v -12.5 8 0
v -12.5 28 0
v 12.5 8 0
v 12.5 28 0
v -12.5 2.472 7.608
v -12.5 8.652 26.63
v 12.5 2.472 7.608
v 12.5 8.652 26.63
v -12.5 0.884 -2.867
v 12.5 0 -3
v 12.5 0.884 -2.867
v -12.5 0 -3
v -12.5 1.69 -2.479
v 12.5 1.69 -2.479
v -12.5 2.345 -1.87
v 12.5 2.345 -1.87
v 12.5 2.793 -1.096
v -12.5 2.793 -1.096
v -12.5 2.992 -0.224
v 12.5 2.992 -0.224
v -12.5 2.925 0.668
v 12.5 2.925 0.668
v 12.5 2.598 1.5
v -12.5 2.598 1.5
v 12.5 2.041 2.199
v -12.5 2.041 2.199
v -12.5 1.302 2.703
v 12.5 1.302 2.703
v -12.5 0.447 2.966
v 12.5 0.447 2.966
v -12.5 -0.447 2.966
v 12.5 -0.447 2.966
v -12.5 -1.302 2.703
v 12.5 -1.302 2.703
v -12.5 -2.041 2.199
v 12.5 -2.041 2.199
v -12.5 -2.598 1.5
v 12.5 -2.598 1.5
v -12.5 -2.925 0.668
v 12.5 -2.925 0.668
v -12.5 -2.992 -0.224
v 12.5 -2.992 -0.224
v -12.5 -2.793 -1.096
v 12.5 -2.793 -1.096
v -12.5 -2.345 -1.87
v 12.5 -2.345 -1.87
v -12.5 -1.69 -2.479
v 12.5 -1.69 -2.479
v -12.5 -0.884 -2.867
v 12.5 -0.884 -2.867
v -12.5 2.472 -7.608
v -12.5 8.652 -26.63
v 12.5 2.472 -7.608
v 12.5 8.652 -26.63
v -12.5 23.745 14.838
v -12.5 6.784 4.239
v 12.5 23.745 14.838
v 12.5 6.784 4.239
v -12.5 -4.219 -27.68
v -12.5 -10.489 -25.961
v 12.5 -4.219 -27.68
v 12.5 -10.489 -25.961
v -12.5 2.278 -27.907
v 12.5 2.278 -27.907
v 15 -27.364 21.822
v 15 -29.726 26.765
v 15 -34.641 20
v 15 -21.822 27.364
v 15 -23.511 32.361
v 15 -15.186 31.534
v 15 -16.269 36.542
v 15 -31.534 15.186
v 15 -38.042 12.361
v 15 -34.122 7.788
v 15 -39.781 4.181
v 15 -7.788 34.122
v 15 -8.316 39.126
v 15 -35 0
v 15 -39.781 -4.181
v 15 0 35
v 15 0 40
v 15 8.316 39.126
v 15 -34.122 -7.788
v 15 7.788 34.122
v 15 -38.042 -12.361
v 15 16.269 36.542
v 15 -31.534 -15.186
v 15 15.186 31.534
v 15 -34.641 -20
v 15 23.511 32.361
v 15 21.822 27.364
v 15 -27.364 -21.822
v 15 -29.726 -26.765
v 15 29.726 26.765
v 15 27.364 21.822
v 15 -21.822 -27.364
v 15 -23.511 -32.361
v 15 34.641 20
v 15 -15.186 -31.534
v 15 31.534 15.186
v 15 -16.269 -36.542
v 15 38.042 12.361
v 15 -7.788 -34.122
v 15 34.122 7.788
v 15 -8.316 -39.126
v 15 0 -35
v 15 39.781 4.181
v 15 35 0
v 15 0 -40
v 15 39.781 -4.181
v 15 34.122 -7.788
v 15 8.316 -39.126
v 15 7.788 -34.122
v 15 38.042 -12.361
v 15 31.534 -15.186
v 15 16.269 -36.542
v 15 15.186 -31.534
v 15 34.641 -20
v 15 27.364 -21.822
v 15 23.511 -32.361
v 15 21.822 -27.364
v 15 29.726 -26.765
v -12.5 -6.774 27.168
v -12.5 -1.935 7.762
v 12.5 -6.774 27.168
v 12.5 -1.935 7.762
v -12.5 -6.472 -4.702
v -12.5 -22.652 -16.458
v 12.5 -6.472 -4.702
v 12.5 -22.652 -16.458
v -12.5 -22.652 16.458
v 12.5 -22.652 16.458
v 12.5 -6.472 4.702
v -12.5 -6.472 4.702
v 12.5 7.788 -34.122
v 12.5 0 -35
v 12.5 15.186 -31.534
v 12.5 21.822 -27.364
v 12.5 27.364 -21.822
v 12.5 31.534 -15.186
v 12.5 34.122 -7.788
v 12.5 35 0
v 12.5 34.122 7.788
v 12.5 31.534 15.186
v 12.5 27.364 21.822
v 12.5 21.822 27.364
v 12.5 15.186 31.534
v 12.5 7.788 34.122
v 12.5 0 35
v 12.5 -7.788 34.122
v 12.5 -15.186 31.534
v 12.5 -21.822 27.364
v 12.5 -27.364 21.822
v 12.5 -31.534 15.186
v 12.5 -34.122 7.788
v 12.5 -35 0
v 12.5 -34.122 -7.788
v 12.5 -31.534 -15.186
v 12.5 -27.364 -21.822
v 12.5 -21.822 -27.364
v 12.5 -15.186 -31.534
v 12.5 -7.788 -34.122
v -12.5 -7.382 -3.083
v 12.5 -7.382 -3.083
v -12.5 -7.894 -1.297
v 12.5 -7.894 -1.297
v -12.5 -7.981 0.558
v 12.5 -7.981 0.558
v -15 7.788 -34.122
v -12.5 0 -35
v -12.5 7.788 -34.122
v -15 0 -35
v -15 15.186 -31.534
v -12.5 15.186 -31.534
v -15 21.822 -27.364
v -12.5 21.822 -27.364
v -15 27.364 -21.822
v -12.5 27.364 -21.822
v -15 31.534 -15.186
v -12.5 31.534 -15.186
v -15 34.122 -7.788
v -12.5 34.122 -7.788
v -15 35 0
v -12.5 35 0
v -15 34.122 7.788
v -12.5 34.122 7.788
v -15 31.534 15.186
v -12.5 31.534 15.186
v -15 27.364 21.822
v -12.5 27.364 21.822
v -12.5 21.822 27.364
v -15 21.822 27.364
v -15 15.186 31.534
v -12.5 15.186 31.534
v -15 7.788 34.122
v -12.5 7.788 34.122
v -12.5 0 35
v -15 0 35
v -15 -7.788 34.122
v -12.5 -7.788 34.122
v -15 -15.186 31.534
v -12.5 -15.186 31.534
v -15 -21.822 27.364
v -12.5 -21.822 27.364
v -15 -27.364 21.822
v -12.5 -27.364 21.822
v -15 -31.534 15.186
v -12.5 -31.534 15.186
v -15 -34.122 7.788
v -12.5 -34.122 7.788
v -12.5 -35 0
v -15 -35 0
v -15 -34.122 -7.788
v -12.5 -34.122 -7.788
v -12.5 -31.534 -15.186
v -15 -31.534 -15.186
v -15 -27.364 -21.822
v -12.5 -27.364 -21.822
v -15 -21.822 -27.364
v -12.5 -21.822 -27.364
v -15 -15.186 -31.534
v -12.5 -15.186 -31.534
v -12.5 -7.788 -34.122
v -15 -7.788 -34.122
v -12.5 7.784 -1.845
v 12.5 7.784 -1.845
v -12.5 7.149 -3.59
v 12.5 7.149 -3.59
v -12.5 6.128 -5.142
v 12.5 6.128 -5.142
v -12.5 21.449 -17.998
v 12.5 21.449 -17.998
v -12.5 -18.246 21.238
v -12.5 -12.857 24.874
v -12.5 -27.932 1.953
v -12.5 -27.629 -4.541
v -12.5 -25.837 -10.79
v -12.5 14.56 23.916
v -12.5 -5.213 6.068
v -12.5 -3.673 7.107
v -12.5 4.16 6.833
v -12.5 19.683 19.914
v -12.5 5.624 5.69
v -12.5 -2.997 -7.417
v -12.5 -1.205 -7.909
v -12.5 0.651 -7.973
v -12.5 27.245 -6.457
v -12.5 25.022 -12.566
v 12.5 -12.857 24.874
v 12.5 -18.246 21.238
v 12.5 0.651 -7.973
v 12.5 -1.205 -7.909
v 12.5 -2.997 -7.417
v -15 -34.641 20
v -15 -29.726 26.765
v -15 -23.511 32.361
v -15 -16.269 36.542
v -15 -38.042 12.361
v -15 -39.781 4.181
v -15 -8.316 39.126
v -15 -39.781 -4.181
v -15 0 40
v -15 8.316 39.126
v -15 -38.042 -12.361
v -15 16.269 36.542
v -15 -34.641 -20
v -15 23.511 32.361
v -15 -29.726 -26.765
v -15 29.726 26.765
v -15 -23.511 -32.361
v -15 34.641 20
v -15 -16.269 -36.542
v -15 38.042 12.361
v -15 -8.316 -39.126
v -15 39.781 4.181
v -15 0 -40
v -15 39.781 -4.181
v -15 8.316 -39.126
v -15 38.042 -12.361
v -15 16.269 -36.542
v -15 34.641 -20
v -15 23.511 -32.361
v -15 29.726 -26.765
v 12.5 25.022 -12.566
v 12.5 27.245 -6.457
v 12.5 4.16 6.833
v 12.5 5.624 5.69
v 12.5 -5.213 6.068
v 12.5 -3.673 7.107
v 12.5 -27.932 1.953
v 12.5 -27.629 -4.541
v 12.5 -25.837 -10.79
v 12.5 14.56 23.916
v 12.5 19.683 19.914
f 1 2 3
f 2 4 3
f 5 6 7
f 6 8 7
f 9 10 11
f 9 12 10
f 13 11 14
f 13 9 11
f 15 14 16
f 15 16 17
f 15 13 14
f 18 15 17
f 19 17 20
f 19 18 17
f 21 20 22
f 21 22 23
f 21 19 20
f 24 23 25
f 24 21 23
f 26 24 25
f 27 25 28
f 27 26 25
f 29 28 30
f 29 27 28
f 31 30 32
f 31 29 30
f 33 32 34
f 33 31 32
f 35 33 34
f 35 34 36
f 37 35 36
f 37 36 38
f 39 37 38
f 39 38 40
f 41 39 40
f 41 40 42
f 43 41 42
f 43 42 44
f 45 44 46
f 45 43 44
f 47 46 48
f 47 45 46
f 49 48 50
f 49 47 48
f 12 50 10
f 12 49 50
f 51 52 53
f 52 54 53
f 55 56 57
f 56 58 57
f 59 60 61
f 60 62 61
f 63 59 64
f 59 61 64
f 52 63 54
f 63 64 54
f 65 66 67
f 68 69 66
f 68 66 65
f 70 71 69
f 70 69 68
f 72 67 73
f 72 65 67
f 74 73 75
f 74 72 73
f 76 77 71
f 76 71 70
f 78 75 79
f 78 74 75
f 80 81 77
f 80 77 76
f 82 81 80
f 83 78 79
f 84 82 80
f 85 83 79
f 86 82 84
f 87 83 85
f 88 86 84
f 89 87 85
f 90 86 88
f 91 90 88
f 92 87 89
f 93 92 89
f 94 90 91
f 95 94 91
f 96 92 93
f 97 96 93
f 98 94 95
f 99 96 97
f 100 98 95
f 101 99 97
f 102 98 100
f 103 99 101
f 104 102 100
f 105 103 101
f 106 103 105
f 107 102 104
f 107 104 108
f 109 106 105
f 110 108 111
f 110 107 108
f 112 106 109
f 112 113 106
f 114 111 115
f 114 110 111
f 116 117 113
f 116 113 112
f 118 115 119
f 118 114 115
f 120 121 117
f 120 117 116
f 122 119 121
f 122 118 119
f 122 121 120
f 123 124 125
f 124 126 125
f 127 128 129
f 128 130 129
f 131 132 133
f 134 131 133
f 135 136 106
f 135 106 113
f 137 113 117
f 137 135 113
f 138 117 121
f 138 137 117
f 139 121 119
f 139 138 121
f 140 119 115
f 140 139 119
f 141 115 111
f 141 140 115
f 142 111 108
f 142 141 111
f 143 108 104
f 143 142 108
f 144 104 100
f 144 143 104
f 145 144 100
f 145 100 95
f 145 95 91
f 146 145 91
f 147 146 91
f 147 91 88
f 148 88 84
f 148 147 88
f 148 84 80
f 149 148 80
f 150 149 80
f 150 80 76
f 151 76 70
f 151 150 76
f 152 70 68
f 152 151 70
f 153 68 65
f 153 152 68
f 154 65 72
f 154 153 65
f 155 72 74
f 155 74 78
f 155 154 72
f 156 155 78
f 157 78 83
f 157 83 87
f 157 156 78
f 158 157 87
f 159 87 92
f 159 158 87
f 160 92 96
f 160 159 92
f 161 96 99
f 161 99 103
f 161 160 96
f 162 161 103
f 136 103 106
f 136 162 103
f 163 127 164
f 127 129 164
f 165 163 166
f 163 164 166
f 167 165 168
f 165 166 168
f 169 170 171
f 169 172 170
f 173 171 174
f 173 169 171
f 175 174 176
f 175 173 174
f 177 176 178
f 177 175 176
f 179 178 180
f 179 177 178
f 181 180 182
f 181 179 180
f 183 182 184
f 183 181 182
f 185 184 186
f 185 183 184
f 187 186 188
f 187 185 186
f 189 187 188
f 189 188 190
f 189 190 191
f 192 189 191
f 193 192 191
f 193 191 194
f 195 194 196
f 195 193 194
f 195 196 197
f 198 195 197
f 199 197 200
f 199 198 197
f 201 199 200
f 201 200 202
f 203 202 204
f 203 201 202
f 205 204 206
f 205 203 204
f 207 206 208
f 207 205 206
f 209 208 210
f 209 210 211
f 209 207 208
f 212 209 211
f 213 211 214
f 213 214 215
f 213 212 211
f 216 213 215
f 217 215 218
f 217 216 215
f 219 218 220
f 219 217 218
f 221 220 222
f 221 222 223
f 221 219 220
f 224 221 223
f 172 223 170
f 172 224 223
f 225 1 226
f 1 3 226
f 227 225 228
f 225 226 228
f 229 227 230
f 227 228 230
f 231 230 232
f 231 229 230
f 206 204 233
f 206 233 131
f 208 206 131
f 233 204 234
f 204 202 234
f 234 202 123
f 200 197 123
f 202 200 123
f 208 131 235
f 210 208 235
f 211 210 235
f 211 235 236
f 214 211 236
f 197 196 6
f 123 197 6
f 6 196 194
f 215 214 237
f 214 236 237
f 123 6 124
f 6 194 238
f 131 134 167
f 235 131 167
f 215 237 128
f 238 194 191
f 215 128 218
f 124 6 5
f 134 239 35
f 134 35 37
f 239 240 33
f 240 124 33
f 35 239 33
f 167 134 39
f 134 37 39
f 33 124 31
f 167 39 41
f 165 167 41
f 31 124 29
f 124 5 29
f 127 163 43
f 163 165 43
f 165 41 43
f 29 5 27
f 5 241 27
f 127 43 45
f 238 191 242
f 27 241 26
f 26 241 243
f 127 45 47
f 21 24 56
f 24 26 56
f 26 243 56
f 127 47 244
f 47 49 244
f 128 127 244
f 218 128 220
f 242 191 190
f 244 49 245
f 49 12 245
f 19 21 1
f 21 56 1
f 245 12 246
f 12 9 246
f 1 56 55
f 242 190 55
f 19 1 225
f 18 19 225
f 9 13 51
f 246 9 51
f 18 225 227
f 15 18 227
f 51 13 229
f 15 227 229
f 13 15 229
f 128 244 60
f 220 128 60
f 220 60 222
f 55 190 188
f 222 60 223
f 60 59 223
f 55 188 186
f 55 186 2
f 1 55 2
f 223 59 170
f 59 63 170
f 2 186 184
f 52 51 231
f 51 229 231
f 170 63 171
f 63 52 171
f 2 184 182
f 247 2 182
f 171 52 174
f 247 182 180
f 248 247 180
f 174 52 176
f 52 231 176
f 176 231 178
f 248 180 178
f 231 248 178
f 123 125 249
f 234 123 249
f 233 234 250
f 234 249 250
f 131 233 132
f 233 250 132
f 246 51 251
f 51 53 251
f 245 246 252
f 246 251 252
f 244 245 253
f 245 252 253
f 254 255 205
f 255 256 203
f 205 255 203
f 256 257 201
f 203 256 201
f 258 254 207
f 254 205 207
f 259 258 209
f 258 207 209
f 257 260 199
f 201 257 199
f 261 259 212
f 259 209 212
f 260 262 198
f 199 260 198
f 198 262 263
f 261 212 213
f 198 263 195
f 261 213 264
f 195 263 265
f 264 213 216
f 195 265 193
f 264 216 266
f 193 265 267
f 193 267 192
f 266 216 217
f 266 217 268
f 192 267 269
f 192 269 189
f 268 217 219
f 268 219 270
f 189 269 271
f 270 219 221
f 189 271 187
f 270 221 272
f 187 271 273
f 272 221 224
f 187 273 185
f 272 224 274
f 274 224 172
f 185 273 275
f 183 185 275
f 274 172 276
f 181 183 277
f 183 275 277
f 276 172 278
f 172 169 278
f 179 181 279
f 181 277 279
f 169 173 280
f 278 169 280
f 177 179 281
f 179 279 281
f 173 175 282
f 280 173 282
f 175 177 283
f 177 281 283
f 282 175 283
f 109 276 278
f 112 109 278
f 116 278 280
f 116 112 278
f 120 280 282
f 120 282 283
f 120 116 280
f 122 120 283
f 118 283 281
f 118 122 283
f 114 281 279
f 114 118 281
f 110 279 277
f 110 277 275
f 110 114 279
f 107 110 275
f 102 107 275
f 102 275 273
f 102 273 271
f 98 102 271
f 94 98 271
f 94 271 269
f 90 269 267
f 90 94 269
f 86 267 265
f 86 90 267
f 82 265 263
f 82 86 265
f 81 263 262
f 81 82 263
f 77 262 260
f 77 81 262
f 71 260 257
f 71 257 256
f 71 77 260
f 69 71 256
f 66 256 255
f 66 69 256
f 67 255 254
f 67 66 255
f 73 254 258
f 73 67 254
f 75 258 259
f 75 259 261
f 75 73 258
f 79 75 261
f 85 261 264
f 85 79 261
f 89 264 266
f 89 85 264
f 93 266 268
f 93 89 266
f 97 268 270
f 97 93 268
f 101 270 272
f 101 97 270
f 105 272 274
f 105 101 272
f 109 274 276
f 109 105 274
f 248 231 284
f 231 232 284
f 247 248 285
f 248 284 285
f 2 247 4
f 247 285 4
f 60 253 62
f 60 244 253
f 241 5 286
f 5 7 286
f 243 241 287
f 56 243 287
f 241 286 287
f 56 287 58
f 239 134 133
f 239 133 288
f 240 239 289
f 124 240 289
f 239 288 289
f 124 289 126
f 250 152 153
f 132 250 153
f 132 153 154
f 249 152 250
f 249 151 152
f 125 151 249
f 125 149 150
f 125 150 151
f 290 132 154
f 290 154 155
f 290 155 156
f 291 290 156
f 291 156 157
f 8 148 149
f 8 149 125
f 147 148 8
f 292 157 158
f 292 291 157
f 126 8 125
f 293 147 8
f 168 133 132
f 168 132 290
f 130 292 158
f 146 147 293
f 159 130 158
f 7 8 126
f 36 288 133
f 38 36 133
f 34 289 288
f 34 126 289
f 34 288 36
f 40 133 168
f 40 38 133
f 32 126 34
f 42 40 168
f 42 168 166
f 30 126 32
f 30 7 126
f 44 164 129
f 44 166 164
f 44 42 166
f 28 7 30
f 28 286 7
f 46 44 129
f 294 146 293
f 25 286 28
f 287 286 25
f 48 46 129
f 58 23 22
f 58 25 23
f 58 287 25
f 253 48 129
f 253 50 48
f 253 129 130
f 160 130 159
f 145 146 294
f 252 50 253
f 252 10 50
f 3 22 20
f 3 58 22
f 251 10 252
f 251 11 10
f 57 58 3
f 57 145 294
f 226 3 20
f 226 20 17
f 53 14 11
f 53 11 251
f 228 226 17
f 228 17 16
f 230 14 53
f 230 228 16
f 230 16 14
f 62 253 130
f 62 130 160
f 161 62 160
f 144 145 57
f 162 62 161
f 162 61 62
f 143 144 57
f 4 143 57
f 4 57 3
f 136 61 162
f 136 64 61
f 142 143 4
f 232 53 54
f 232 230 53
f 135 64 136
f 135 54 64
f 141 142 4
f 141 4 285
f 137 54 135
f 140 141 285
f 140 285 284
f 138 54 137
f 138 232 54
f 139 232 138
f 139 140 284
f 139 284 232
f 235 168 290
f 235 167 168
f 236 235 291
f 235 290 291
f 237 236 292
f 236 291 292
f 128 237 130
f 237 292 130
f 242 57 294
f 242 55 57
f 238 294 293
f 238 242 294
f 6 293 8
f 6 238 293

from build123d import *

# Parameters (mm, degrees)
SKETCH1_R           = 35
SKETCH1_R_2         = 3
BOSS_EXTRUDE1_DEPTH = 12.5
SKETCH2_R           = 40
SKETCH2_R_2         = 35
BOSS_EXTRUDE2_DEPTH = 15


with BuildPart() as part:
    # Sketch1 → Boss-Extrude1 (new, symmetric)
    with BuildSketch(Plane(origin=(0, 0, 0), x_dir=(0, 0, -1), z_dir=(1, 0, 0))):
        Circle(SKETCH1_R)
        Circle(SKETCH1_R_2, mode=Mode.SUBTRACT)
        with BuildLine():
            Line((0, 28), (0, 8))
            ThreePointArc((0, 8), (2.736161147, 7.517540966), (5.142300877, 6.128355545))
            Line((5.142300877, 6.128355545), (17.998053071, 21.449244407))
            ThreePointArc((17.998053071, 21.449244407), (9.576564013, 26.311393382), (0, 28))
        make_face(mode=Mode.SUBTRACT)
        with BuildLine():
            Line((26.629582456, 8.652475842), (7.60845213, 2.472135955))
            ThreePointArc((7.60845213, 2.472135955), (7.995126616, -0.279195974), (7.417470837, -2.996852747))
            Line((7.417470837, -2.996852747), (25.961147928, -10.488984616))
            ThreePointArc((25.961147928, -10.488984616), (27.982943157, -0.977185908), (26.629582456, 8.652475842))
        make_face(mode=Mode.SUBTRACT)
        with BuildLine():
            Line((16.457987064, -22.652475842), (4.702282018, -6.472135955))
            ThreePointArc((4.702282018, -6.472135955), (2.205098847, -7.690093568), (-0.55805179, -7.980512402))
            Line((-0.55805179, -7.980512402), (-1.953181265, -27.931793407))
            ThreePointArc((-1.953181265, -27.931793407), (7.717845963, -26.915327486), (16.457987064, -22.652475842))
        make_face(mode=Mode.SUBTRACT)
        with BuildLine():
            Line((-16.457987064, -22.652475842), (-4.702282018, -6.472135955))
            ThreePointArc((-4.702282018, -6.472135955), (-6.63230058, -4.473543228), (-7.76236581, -1.935375165))
            Line((-7.76236581, -1.935375165), (-27.168280336, -6.773813077))
            ThreePointArc((-27.168280336, -6.773813077), (-23.213052032, -15.657401297), (-16.457987064, -22.652475842))
        make_face(mode=Mode.SUBTRACT)
        with BuildLine():
            Line((-26.629582456, 8.652475842), (-7.60845213, 2.472135955))
            ThreePointArc((-7.60845213, 2.472135955), (-6.304086029, 4.925291803), (-4.239354114, 6.784384769))
            Line((-4.239354114, 6.784384769), (-14.837739399, 23.745346692))
            ThreePointArc((-14.837739399, 23.745346692), (-22.064301101, 17.238521309), (-26.629582456, 8.652475842))
        make_face(mode=Mode.SUBTRACT)
    extrude(amount=BOSS_EXTRUDE1_DEPTH, both=True)

    # Sketch2 → Boss-Extrude2 (add, symmetric)
    with BuildSketch(Plane(origin=(0, 0, 0), x_dir=(0, 0, -1), z_dir=(1, 0, 0))):
        Circle(SKETCH2_R)
        Circle(SKETCH2_R_2, mode=Mode.SUBTRACT)
    extrude(amount=BOSS_EXTRUDE2_DEPTH, both=True)


solid = part.part
